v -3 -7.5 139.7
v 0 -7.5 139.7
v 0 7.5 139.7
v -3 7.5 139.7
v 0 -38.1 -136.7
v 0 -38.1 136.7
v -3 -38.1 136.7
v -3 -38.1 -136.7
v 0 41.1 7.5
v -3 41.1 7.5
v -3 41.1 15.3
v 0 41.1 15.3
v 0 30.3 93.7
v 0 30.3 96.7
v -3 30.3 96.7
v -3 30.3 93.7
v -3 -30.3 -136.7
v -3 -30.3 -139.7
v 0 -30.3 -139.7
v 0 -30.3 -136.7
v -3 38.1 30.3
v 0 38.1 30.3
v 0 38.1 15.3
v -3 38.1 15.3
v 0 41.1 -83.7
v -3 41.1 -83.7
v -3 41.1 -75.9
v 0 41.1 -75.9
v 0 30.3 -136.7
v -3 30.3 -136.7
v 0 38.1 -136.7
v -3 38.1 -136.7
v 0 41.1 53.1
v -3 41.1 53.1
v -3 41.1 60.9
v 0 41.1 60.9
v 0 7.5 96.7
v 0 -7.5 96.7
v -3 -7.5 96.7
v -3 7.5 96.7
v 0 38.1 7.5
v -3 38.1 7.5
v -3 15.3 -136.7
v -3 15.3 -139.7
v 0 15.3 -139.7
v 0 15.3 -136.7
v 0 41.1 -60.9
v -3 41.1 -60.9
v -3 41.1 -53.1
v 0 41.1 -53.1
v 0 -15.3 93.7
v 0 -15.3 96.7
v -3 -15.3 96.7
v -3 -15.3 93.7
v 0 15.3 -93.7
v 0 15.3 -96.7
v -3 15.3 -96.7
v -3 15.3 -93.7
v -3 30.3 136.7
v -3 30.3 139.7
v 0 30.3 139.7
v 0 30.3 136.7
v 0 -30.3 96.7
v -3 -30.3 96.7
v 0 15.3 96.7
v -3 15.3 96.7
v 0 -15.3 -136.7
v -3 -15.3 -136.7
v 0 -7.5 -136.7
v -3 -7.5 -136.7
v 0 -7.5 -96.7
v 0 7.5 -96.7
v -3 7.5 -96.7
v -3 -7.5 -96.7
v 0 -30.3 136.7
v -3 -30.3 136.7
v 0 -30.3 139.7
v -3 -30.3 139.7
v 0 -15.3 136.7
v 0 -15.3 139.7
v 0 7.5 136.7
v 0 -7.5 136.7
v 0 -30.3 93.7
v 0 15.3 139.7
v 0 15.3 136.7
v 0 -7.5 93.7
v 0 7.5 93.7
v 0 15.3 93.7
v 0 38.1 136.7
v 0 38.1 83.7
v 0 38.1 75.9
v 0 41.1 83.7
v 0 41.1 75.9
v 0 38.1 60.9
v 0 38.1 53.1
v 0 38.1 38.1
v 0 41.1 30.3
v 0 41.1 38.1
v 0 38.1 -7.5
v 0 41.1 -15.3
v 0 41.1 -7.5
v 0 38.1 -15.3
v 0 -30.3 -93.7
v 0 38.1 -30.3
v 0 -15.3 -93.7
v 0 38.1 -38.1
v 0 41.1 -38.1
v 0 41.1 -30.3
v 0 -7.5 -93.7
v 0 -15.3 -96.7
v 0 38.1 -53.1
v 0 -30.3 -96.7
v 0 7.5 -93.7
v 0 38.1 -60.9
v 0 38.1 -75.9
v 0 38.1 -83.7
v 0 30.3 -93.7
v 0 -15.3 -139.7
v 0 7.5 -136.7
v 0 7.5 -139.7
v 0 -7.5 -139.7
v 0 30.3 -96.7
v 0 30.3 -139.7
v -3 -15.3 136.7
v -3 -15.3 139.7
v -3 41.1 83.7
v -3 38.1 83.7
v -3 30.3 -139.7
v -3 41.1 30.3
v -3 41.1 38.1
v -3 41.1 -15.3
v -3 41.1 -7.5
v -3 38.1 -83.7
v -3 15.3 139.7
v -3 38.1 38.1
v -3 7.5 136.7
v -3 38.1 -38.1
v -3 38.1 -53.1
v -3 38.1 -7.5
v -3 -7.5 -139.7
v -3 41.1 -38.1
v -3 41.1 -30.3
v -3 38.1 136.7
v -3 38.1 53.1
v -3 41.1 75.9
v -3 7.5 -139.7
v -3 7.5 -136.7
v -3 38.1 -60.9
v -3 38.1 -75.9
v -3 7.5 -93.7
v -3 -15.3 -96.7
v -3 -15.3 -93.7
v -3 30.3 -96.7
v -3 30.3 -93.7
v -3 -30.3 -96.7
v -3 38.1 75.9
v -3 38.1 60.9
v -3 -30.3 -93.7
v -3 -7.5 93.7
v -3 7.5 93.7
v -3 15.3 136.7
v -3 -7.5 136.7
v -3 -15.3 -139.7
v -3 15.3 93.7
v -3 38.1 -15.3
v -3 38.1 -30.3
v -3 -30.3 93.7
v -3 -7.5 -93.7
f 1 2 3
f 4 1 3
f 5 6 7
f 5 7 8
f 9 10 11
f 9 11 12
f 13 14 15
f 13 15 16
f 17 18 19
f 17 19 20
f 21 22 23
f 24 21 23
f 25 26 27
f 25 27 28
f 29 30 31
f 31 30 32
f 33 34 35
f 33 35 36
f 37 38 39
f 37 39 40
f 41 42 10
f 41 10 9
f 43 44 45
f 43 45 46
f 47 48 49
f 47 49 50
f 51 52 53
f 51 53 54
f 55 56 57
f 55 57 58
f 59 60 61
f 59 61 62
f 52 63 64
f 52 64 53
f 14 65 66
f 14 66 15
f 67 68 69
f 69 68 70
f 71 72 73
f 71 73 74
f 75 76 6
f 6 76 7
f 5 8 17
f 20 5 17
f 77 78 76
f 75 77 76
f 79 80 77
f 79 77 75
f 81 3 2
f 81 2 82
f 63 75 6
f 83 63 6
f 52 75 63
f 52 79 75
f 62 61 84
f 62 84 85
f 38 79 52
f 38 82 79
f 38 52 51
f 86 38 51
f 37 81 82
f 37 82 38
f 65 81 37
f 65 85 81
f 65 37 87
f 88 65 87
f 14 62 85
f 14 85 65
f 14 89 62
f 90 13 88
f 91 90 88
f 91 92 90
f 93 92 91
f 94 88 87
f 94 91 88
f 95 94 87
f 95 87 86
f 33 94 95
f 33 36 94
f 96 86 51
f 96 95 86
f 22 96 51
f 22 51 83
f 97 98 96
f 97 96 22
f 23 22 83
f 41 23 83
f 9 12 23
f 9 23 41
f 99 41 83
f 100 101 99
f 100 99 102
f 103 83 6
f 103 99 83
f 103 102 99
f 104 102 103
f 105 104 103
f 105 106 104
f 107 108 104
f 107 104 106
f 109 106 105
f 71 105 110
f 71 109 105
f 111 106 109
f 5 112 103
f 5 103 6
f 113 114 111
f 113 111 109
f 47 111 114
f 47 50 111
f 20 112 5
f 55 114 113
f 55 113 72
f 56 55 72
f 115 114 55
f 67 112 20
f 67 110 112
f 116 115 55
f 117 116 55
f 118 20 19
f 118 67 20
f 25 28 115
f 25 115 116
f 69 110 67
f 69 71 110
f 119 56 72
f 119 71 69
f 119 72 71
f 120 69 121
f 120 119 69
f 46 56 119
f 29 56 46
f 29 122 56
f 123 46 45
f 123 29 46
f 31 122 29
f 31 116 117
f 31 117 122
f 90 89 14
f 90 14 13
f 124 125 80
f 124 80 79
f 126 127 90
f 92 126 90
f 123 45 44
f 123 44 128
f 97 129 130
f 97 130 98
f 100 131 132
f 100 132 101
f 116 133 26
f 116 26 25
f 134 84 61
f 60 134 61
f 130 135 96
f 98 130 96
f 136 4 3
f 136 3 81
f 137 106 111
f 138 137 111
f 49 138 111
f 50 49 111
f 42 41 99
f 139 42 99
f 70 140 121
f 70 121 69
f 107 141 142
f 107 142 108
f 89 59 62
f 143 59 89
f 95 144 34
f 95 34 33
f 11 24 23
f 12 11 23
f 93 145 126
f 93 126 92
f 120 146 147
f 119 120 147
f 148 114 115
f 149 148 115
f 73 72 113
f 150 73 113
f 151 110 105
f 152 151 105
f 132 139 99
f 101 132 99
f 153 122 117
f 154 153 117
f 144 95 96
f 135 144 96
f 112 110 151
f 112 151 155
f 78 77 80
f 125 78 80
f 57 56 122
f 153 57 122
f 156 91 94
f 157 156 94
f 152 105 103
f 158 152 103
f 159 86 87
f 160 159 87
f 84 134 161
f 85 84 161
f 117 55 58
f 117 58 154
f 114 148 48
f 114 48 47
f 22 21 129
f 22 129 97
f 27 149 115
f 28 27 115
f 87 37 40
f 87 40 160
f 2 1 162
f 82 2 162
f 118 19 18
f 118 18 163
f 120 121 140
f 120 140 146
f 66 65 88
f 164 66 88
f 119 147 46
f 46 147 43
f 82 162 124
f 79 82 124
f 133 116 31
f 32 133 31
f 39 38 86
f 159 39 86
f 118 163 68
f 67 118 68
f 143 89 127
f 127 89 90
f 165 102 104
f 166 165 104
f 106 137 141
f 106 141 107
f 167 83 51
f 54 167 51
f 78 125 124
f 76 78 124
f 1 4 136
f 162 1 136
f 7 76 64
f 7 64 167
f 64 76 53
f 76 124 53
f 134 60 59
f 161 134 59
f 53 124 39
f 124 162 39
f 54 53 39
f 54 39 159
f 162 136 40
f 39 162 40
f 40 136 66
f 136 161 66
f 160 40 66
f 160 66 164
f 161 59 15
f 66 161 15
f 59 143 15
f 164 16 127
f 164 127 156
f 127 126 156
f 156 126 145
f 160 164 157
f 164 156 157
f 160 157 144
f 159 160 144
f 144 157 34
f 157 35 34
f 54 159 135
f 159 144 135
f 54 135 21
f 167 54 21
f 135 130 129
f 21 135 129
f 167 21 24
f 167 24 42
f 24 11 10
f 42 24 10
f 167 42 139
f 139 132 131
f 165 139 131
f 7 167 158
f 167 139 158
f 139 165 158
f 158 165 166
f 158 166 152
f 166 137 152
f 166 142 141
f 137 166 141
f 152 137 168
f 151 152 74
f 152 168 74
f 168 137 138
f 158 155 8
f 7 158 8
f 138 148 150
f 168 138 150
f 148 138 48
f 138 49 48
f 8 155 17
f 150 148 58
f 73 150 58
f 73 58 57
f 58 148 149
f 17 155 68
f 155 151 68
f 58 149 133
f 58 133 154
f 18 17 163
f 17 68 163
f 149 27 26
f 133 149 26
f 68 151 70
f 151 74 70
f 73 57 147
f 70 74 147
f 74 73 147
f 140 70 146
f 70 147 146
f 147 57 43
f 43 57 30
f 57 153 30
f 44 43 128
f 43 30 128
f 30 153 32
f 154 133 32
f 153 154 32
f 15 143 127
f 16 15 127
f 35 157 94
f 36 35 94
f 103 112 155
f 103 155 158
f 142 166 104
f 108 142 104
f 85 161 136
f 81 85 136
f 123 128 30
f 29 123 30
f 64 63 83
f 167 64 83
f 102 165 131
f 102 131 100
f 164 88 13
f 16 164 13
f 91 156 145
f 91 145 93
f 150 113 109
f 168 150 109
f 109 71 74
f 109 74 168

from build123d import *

# Parameters (mm, degrees)
SKETCH1_W               = 279.4
SKETCH1_H               = 76.2
BOSS_EXTRUDE1_DEPTH     = 3
SKETCH3_W               = 3
SKETCH3_H               = 7.8
CUT_EXTRUDE1_DEPTH      = 145.833352512
LPATTERN1_COUNT         = 4
LPATTERN1_PITCH         = 22.8
MIRROR1_COPY_1_SKETCH_W = 3
MIRROR1_COPY_1_SKETCH_H = 7.8
MIRROR1_COPY_1_DEPTH    = 145.833352512
MIRROR1_COPY_2_SKETCH_W = 3
MIRROR1_COPY_2_SKETCH_H = 7.8
MIRROR1_COPY_2_DEPTH    = 145.833352512
MIRROR1_COPY_3_SKETCH_W = 3
MIRROR1_COPY_3_SKETCH_H = 7.8
MIRROR1_COPY_3_DEPTH    = 145.833352512
SKETCH4_W               = 3
SKETCH4_H               = 15
CUT_EXTRUDE2_DEPTH      = 10
LPATTERN2_COUNT         = 3
LPATTERN2_PITCH         = 22.8
MIRROR2_COPY_1_SKETCH_W = 3
MIRROR2_COPY_1_SKETCH_H = 15
MIRROR2_COPY_1_DEPTH    = 10
MIRROR2_COPY_2_SKETCH_W = 3
MIRROR2_COPY_2_SKETCH_H = 15
MIRROR2_COPY_2_DEPTH    = 10
SKETCH5_W               = 3
SKETCH5_H               = 7.8
BOSS_EXTRUDE2_DEPTH     = 3
LPATTERN3_COUNT         = 8
LPATTERN3_PITCH         = 22.8


with BuildPart() as part:
    # Sketch1 → Boss-Extrude1 (new body)
    with BuildSketch(Plane(origin=(0, 0, 0), x_dir=(0, 0, -1), z_dir=(1, 0, 0))):
        Rectangle(SKETCH1_W, SKETCH1_H)
    extrude(amount=-BOSS_EXTRUDE1_DEPTH)

    # Sketch3 → Cut-Extrude1 (cut, through all)
    with BuildSketch(Plane.ZY.offset(3)):
        with Locations((-138.2, 34.2)):
            Rectangle(SKETCH3_W, SKETCH3_H)
    cut_extrude1 = extrude(amount=-CUT_EXTRUDE1_DEPTH, mode=Mode.SUBTRACT)

    # LPattern1: Cut-Extrude1 ×4
    with Locations(*[(0, -i * LPATTERN1_PITCH, 0) for i in range(1, LPATTERN1_COUNT)]):
        add(cut_extrude1, mode=Mode.SUBTRACT)

    # Mirror1: Cut-Extrude1 across plane
    add(cut_extrude1.mirror(Plane.XY), mode=Mode.SUBTRACT)

    # Mirror1 copy 1 sketch → Mirror1 copy 1 (cut, through all)
    with BuildSketch(Plane(origin=(-3, -22.8, 0), x_dir=(0, 0, -1), z_dir=(-1, 0, 0))):
        with Locations((-138.2, -34.2)):
            Rectangle(MIRROR1_COPY_1_SKETCH_W, MIRROR1_COPY_1_SKETCH_H)
    extrude(amount=-MIRROR1_COPY_1_DEPTH, mode=Mode.SUBTRACT)

    # Mirror1 copy 2 sketch → Mirror1 copy 2 (cut, through all)
    with BuildSketch(Plane(origin=(-3, -45.6, 0), x_dir=(0, 0, -1), z_dir=(-1, 0, 0))):
        with Locations((-138.2, -34.2)):
            Rectangle(MIRROR1_COPY_2_SKETCH_W, MIRROR1_COPY_2_SKETCH_H)
    extrude(amount=-MIRROR1_COPY_2_DEPTH, mode=Mode.SUBTRACT)

    # Mirror1 copy 3 sketch → Mirror1 copy 3 (cut, through all)
    with BuildSketch(Plane(origin=(-3, -68.4, 0), x_dir=(0, 0, -1), z_dir=(-1, 0, 0))):
        with Locations((-138.2, -34.2)):
            Rectangle(MIRROR1_COPY_3_SKETCH_W, MIRROR1_COPY_3_SKETCH_H)
    extrude(amount=-MIRROR1_COPY_3_DEPTH, mode=Mode.SUBTRACT)

    # Sketch4 → Cut-Extrude2 (cut)
    with BuildSketch(Plane(origin=(0, 0, 0), x_dir=(0, 0, -1), z_dir=(1, 0, 0))):
        with Locations((-95.2, 22.8)):
            Rectangle(SKETCH4_W, SKETCH4_H)
    cut_extrude2 = extrude(amount=-CUT_EXTRUDE2_DEPTH, mode=Mode.SUBTRACT)

    # LPattern2: Cut-Extrude2 ×3
    with Locations(*[(0, -i * LPATTERN2_PITCH, 0) for i in range(1, LPATTERN2_COUNT)]):
        add(cut_extrude2, mode=Mode.SUBTRACT)

    # Mirror2: Cut-Extrude2 across plane
    add(cut_extrude2.mirror(Plane.XY), mode=Mode.SUBTRACT)

    # Mirror2 copy 1 sketch → Mirror2 copy 1 (cut)
    with BuildSketch(Plane(origin=(0, -22.8, 0), x_dir=(0, 0, 1), z_dir=(1, 0, 0))):
        with Locations((-95.2, -22.8)):
            Rectangle(MIRROR2_COPY_1_SKETCH_W, MIRROR2_COPY_1_SKETCH_H)
    extrude(amount=-MIRROR2_COPY_1_DEPTH, mode=Mode.SUBTRACT)

    # Mirror2 copy 2 sketch → Mirror2 copy 2 (cut)
    with BuildSketch(Plane(origin=(0, -45.6, 0), x_dir=(0, 0, 1), z_dir=(1, 0, 0))):
        with Locations((-95.2, -22.8)):
            Rectangle(MIRROR2_COPY_2_SKETCH_W, MIRROR2_COPY_2_SKETCH_H)
    extrude(amount=-MIRROR2_COPY_2_DEPTH, mode=Mode.SUBTRACT)

    # Sketch5 → Boss-Extrude2 (add)
    with BuildSketch(Plane(origin=(0, 38.1, 0), x_dir=(1, 0, 0), z_dir=(0, 1, 0))):
        with Locations((-1.5, -79.8)):
            Rectangle(SKETCH5_W, SKETCH5_H)
    boss_extrude2 = extrude(amount=BOSS_EXTRUDE2_DEPTH)

    # LPattern3: Boss-Extrude2 ×8
    with Locations(*[(0, 0, -i * LPATTERN3_PITCH) for i in range(1, LPATTERN3_COUNT)]):
        add(boss_extrude2)


solid = part.part
